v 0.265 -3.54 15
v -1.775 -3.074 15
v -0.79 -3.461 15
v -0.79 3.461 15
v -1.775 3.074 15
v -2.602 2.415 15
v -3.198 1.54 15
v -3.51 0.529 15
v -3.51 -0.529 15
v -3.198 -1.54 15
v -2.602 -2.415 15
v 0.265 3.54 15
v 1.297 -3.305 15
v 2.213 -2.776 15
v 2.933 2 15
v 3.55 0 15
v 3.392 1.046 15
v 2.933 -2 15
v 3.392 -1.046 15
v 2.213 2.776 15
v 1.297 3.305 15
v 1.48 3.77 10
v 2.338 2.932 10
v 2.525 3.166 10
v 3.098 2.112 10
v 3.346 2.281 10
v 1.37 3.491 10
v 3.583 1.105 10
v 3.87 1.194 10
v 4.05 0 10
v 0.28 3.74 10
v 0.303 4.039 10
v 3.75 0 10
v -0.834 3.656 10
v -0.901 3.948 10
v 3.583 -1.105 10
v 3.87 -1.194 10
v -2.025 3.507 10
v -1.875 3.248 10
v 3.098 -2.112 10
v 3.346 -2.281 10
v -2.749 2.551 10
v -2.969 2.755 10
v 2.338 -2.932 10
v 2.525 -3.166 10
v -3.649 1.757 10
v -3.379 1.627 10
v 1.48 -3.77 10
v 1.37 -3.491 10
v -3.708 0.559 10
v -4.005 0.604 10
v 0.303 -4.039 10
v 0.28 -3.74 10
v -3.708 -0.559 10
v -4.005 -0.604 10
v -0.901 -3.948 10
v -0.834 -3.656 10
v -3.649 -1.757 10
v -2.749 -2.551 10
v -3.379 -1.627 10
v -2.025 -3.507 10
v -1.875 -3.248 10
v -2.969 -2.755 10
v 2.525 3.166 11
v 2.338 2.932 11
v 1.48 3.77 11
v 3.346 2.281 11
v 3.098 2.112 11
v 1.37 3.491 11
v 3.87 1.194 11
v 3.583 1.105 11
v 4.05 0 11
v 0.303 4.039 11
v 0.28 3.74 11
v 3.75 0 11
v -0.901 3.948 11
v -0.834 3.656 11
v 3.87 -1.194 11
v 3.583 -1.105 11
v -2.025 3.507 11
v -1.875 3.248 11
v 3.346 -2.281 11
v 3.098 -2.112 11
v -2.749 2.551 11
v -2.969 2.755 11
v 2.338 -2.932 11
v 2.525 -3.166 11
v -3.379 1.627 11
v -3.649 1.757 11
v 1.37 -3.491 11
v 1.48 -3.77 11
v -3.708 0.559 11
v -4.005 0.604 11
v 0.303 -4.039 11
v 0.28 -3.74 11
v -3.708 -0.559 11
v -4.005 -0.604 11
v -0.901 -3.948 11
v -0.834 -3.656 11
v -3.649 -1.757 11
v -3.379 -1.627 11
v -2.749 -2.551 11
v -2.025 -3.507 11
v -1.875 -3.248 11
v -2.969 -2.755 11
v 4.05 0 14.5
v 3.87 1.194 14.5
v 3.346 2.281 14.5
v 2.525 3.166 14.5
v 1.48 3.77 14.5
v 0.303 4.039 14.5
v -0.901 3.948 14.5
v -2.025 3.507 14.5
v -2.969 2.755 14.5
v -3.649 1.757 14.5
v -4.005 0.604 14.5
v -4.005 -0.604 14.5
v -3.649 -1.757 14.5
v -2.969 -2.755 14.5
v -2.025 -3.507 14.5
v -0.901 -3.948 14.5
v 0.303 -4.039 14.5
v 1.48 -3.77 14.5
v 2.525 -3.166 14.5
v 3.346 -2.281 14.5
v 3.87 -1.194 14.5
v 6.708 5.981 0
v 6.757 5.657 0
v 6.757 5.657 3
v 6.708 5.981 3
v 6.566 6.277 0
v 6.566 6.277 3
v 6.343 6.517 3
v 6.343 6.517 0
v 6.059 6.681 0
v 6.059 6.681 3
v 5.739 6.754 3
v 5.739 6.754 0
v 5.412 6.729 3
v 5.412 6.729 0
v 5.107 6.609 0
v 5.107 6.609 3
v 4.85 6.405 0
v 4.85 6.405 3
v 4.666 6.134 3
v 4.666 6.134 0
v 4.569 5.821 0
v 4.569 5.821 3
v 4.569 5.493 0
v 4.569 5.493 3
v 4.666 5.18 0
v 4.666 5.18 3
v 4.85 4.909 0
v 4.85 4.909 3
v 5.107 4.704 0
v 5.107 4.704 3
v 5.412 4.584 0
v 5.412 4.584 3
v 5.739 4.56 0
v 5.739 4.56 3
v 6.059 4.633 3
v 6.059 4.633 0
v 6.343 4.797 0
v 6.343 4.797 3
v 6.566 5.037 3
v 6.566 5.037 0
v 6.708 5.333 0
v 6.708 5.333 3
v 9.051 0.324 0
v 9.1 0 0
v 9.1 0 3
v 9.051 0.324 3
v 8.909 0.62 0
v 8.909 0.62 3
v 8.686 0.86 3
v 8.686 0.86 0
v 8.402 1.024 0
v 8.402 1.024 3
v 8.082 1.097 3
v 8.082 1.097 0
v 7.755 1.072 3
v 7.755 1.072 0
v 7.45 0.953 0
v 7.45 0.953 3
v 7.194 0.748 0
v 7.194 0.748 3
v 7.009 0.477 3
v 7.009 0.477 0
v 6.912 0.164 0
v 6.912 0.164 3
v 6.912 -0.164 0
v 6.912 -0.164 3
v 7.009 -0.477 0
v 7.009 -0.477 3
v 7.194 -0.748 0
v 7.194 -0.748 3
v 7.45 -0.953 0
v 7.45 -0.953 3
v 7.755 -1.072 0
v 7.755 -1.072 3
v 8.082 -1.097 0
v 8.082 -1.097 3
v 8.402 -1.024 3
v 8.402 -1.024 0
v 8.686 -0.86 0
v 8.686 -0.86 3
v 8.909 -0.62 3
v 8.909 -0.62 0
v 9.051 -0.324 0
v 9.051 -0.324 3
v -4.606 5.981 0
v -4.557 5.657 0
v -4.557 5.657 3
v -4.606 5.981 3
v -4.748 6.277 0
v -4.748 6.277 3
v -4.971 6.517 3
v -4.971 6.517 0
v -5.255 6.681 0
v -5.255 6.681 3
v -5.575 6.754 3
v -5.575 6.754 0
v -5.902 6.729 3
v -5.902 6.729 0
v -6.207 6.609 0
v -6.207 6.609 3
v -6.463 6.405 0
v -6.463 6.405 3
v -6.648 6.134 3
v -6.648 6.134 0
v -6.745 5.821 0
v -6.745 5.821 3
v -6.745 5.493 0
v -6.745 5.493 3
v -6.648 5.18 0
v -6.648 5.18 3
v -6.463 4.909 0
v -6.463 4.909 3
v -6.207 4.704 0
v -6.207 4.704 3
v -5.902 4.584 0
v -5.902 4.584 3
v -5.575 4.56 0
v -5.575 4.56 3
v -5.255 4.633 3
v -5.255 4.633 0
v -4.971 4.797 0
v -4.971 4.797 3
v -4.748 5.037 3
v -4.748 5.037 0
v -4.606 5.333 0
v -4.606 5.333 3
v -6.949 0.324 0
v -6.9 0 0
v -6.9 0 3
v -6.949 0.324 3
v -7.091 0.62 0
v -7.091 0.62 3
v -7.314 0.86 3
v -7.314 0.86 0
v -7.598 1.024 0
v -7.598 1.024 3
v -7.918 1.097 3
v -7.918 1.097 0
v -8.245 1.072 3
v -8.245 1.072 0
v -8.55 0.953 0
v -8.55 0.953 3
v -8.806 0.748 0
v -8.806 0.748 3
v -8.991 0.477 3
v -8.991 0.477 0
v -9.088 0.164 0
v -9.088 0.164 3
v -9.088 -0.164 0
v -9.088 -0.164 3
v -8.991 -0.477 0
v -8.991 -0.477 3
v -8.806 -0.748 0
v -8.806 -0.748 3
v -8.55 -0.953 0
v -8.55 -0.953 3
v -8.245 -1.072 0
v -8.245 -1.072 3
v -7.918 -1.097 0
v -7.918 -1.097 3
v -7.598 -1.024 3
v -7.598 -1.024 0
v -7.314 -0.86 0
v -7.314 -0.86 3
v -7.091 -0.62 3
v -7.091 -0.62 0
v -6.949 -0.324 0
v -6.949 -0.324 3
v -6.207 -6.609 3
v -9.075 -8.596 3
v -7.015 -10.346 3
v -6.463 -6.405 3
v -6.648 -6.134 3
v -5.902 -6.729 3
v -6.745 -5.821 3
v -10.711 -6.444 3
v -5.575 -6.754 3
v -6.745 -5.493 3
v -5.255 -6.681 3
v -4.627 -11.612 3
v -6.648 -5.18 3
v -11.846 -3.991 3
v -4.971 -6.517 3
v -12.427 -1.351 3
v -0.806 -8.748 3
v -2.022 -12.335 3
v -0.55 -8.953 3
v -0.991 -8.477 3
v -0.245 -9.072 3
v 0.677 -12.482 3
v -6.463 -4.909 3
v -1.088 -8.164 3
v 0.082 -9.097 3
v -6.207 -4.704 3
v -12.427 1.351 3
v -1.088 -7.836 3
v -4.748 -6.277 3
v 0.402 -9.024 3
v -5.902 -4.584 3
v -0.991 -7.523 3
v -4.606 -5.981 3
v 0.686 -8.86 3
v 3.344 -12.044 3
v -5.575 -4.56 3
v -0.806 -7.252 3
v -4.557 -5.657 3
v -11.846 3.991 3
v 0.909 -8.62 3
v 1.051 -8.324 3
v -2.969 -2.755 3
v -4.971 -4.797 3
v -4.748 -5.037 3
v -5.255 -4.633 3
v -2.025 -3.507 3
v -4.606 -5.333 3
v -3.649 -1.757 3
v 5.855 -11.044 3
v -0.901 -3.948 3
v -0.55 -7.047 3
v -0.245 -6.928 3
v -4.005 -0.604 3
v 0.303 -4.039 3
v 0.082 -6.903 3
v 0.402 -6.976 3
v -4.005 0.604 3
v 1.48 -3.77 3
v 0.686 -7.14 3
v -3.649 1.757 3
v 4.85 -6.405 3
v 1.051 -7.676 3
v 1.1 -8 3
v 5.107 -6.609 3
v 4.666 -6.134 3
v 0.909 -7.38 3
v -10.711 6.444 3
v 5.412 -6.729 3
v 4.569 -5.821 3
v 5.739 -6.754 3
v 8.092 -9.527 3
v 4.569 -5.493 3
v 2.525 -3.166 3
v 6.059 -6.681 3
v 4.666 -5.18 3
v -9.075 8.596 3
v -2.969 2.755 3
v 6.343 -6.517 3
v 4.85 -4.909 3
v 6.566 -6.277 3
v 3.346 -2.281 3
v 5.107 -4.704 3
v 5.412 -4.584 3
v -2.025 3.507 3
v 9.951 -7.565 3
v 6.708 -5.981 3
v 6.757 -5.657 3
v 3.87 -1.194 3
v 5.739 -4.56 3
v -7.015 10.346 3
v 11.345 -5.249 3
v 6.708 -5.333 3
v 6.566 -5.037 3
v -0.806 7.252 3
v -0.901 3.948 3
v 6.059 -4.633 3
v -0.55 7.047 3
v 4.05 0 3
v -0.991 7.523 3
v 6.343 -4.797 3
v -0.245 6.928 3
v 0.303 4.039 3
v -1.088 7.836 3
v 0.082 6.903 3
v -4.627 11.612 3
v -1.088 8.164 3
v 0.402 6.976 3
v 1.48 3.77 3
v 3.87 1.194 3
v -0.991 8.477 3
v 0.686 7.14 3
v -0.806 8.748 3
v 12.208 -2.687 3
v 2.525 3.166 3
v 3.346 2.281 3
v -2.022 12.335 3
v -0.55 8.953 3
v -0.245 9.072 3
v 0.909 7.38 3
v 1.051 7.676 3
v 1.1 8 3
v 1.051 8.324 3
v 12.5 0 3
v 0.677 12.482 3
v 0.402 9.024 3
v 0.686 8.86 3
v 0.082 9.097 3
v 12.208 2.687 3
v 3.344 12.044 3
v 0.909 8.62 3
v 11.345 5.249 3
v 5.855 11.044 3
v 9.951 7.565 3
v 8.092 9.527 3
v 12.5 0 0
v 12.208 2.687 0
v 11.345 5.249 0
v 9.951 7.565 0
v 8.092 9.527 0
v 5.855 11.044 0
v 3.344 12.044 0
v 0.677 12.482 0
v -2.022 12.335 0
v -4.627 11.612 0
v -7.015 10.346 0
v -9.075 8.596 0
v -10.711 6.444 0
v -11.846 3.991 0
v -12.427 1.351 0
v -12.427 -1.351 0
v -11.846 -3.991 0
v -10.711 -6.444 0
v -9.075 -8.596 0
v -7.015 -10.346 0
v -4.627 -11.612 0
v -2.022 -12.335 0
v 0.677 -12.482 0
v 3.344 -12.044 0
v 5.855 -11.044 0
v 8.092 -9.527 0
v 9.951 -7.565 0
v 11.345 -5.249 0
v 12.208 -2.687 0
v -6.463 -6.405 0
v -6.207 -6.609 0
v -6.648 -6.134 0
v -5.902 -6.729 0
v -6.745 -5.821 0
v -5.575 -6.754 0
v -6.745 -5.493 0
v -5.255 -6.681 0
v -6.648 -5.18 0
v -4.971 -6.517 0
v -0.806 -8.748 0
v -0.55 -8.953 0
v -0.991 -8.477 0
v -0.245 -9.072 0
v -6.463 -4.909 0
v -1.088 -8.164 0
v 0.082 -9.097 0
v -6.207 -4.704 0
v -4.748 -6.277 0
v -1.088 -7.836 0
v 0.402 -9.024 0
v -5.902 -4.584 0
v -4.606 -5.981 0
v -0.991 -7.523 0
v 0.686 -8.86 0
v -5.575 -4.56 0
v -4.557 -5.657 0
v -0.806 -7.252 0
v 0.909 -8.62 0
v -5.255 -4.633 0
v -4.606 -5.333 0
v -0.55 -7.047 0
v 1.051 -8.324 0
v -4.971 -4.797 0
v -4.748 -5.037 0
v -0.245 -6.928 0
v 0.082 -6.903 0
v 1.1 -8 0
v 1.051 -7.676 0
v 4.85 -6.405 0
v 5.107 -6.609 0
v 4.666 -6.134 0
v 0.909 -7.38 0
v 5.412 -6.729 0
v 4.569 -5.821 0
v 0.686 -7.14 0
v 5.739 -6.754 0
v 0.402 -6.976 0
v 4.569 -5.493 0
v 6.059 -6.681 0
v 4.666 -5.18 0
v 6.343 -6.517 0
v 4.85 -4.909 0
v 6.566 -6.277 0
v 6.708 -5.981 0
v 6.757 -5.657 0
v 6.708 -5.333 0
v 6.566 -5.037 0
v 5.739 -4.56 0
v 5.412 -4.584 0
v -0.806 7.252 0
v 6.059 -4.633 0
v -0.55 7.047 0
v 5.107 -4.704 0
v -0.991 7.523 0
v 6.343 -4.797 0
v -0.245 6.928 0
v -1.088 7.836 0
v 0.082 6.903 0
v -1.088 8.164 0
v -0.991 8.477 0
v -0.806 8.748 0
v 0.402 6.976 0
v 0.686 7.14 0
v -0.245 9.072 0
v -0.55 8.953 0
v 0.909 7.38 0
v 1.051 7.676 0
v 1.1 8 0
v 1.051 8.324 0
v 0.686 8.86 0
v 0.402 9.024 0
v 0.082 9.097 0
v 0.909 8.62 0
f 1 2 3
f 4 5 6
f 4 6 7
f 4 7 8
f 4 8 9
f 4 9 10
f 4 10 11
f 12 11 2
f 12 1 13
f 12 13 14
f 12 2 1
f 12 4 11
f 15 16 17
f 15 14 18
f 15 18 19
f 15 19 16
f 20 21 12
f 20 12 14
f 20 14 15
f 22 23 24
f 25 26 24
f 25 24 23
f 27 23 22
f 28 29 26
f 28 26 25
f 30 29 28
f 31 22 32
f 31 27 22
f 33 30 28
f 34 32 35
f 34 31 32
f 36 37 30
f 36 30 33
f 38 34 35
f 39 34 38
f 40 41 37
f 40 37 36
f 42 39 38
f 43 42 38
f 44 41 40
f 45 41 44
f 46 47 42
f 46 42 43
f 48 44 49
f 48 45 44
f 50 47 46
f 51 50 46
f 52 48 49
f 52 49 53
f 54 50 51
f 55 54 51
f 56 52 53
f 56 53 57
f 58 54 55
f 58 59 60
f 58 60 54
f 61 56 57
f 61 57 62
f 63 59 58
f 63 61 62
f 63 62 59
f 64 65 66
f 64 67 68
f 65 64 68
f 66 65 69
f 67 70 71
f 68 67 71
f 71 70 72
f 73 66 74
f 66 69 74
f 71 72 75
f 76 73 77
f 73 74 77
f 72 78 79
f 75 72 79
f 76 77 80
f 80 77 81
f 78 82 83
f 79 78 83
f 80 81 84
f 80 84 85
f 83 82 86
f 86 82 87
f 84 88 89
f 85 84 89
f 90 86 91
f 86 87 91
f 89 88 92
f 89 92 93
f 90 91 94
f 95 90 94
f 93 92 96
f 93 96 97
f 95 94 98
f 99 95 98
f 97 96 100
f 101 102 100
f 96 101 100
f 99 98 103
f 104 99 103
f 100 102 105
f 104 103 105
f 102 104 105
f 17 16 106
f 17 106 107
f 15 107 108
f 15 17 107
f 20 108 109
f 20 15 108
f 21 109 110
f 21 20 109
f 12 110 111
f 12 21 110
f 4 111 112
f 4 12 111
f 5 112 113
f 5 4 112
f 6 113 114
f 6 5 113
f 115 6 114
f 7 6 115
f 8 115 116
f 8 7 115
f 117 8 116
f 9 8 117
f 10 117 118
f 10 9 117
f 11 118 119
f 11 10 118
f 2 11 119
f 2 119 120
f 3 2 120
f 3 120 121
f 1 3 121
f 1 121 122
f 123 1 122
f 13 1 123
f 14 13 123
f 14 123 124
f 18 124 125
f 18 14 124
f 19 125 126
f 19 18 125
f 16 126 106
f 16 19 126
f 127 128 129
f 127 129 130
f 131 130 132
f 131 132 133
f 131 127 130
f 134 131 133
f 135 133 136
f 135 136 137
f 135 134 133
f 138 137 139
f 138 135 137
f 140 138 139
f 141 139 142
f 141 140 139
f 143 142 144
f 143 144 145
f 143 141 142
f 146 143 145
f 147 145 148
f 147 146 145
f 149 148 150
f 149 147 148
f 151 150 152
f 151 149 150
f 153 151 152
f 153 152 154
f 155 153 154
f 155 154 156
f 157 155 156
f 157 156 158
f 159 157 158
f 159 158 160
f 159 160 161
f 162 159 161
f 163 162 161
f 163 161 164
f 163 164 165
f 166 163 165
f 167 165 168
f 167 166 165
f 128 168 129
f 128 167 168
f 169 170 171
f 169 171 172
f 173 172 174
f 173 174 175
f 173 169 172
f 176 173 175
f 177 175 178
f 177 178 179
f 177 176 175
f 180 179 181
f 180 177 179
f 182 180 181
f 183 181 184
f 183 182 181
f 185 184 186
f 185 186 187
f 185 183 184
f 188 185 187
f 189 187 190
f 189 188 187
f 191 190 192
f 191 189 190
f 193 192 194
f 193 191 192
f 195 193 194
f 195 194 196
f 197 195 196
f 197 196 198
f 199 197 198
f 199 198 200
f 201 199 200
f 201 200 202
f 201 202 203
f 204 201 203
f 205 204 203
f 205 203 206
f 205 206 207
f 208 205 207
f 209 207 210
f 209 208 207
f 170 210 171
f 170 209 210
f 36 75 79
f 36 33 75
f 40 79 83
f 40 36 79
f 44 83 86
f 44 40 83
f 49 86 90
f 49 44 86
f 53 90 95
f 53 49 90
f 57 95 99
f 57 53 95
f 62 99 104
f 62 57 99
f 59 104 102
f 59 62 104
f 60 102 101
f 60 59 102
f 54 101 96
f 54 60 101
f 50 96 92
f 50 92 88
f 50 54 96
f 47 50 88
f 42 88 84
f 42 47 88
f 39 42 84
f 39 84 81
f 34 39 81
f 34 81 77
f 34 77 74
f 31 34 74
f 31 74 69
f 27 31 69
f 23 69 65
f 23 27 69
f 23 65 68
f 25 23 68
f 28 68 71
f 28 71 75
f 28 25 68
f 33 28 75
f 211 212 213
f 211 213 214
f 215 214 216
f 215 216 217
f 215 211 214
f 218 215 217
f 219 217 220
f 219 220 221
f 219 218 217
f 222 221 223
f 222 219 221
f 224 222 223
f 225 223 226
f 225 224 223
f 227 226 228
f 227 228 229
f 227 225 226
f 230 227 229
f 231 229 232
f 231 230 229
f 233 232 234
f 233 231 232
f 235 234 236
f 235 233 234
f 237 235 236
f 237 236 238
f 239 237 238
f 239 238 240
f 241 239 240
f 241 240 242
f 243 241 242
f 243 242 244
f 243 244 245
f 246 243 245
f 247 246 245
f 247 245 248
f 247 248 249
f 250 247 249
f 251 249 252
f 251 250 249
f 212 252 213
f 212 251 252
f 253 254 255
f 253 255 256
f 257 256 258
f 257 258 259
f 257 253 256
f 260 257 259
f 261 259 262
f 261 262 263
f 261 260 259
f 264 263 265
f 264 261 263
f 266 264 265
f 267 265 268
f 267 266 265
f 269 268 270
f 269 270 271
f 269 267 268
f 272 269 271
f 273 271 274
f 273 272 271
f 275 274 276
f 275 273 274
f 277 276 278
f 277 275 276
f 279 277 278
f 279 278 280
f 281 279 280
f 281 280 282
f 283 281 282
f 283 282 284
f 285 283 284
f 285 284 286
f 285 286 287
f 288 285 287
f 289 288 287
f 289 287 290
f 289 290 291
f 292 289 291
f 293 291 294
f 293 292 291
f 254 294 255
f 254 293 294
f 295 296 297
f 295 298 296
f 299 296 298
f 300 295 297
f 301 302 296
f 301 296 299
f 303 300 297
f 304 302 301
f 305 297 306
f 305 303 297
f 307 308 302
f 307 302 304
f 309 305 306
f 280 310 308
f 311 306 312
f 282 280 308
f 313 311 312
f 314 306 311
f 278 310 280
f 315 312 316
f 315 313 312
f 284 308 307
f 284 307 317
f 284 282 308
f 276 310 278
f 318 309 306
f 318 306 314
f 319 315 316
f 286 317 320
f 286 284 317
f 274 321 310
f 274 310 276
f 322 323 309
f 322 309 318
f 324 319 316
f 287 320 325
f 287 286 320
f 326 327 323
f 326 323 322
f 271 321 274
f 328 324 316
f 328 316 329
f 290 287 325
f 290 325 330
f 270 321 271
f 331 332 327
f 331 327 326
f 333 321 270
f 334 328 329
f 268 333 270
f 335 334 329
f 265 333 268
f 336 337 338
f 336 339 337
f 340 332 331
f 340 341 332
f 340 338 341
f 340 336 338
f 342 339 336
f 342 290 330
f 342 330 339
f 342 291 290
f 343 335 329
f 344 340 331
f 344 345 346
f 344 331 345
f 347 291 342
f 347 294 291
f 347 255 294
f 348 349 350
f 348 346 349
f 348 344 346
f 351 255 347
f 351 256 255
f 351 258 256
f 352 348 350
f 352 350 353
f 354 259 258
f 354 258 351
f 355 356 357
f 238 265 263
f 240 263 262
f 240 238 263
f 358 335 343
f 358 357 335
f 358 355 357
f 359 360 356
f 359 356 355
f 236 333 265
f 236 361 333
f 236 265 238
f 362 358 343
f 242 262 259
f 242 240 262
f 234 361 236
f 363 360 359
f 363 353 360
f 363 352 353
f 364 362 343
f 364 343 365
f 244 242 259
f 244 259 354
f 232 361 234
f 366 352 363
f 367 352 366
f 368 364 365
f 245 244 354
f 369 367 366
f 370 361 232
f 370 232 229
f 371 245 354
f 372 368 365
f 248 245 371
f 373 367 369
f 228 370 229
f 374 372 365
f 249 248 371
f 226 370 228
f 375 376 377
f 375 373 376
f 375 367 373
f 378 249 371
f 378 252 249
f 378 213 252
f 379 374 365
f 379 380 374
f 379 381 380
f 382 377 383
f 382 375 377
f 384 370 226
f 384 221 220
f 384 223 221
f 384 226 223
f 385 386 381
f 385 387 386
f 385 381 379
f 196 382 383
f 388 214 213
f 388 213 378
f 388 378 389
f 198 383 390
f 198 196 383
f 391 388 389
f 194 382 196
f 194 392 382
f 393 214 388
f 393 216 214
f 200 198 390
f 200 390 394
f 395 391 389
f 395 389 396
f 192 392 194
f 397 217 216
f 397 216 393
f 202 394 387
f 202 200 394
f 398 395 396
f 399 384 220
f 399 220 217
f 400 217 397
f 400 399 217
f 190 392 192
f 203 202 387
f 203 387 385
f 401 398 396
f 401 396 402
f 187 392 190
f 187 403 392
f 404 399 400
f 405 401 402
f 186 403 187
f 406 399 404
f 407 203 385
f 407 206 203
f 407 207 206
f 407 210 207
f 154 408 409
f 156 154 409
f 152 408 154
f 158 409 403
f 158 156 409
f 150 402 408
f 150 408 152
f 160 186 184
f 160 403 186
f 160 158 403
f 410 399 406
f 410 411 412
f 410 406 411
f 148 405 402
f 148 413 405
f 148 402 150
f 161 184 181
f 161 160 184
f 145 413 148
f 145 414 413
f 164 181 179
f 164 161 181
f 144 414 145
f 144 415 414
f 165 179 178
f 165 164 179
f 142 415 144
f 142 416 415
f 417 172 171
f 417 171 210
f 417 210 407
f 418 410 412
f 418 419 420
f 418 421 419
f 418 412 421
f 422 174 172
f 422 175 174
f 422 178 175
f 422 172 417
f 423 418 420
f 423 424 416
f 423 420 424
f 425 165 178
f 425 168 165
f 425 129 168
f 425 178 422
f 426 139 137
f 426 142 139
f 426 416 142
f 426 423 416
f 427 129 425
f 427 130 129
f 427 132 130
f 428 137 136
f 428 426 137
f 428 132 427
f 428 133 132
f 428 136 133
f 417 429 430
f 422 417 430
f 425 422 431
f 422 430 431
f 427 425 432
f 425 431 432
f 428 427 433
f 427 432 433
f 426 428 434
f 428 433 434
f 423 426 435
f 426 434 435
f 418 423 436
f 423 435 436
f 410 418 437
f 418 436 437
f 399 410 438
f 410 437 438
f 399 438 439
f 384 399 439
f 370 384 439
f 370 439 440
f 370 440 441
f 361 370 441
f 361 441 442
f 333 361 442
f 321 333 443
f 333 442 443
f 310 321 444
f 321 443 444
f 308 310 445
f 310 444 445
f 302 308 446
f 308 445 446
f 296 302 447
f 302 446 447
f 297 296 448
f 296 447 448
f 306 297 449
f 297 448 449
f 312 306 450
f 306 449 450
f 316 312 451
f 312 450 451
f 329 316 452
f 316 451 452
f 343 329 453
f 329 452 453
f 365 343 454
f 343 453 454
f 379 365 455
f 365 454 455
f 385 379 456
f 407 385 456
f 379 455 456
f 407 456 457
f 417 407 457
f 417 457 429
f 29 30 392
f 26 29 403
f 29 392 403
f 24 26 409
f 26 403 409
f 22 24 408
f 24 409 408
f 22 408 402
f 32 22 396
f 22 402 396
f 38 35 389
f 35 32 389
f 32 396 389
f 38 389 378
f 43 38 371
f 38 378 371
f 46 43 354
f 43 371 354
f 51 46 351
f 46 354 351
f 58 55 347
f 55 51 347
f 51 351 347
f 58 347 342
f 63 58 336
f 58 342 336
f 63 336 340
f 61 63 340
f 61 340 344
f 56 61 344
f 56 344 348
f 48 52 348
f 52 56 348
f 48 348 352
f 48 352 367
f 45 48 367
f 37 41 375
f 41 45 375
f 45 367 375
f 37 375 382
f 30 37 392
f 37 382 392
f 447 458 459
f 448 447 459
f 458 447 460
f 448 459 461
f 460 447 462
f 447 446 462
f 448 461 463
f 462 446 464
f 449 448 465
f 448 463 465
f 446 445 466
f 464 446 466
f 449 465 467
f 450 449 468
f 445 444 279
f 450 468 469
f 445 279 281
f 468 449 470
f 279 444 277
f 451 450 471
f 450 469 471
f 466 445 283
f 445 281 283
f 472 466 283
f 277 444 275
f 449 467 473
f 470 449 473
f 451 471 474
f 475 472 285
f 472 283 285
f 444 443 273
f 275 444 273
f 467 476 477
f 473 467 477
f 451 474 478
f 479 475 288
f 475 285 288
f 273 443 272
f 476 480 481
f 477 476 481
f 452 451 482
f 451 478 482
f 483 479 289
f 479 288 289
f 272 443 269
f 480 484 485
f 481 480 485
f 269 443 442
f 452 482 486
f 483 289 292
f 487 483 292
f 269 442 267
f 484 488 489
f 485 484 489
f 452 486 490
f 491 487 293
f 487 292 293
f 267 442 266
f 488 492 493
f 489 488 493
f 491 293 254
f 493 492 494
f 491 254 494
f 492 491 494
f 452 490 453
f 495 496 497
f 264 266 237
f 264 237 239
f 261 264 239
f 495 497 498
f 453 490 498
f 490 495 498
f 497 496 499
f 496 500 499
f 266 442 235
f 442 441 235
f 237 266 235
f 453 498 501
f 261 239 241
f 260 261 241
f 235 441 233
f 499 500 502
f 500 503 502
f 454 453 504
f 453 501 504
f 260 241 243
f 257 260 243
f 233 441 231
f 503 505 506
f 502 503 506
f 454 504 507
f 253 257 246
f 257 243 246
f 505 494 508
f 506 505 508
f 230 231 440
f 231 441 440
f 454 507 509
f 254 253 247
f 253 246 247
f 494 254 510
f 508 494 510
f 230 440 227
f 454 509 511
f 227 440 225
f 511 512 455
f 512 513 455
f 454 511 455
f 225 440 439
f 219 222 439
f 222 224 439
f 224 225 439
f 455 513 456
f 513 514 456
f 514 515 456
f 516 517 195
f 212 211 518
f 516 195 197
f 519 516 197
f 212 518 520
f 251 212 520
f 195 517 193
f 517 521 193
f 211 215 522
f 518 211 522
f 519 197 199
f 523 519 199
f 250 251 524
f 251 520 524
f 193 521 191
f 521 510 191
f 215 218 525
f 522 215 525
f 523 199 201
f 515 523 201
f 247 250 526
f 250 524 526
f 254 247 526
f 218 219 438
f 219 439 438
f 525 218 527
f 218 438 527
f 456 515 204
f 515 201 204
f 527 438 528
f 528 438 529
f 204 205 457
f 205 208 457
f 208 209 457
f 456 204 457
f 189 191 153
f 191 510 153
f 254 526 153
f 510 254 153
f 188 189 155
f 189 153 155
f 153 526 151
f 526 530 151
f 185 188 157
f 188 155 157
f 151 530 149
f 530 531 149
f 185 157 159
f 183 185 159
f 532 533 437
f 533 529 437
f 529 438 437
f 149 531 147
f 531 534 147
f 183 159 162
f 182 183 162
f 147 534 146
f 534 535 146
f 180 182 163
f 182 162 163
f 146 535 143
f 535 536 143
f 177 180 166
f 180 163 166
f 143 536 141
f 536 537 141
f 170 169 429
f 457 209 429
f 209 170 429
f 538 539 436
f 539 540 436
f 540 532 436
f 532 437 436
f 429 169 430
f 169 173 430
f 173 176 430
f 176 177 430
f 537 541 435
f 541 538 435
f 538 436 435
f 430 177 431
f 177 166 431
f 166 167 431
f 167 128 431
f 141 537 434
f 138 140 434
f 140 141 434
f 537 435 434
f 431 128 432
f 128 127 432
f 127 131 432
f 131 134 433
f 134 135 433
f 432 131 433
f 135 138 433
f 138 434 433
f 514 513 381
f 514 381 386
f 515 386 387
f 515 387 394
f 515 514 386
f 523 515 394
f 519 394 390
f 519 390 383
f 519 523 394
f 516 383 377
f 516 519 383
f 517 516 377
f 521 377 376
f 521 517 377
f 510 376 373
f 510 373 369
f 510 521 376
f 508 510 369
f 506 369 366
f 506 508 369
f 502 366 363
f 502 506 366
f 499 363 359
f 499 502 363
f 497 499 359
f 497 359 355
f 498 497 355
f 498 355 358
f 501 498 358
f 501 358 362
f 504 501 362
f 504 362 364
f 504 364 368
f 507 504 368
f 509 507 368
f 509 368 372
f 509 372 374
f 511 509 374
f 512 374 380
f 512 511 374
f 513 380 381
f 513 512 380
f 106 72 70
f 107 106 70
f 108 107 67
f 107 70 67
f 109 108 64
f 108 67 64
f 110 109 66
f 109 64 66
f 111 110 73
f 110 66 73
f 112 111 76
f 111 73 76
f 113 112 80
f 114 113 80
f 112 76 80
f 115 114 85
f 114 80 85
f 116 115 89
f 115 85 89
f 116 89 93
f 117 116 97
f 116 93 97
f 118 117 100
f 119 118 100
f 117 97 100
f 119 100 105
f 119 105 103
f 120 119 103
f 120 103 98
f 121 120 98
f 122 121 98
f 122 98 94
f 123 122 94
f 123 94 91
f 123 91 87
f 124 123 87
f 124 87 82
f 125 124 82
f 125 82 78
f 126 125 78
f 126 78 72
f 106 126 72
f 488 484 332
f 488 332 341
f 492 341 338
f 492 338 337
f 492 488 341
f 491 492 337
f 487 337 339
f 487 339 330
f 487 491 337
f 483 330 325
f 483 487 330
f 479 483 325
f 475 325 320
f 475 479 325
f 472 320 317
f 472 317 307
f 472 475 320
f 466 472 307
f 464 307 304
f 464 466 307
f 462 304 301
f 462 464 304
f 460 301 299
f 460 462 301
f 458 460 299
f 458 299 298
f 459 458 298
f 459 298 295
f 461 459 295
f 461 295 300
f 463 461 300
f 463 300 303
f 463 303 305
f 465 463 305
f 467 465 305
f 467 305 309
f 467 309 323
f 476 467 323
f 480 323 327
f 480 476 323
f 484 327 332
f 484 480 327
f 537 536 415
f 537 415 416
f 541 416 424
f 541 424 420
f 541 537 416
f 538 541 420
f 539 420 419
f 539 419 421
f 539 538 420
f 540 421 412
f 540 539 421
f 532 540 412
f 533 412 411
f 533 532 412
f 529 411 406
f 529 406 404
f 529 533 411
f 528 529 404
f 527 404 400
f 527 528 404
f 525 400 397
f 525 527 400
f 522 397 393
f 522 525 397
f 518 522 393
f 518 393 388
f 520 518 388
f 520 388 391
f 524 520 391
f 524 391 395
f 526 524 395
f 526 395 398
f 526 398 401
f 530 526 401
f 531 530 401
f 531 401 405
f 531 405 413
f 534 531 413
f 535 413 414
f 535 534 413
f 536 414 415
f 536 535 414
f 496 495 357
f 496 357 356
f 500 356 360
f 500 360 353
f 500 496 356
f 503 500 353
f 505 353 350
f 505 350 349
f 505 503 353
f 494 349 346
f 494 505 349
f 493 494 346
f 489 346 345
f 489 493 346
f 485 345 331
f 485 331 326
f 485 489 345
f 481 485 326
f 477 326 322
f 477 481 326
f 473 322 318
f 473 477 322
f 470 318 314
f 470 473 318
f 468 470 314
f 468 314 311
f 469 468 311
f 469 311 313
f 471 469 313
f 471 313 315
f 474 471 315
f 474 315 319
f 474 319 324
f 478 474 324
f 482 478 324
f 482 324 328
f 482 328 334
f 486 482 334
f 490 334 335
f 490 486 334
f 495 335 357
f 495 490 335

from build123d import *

# Parameters (mm, degrees)
SKETCH1_R           = 12.5
SKETCH1_R_2         = 1.1
BOSS_EXTRUDE1_DEPTH = 3
SKETCH2_R           = 4.05
BOSS_EXTRUDE2_DEPTH = 12
SKETCH3_W           = 1
SKETCH3_H           = 0.6
FILLET1_SIZE        = 0.5


with BuildPart() as part:
    # Sketch1 → Boss-Extrude1 (new body)
    with BuildSketch(Plane.XY):
        Circle(SKETCH1_R)
        with Locations((0, 8)):
            Circle(SKETCH1_R_2, mode=Mode.SUBTRACT)
        with Locations((5.656854249, 5.656854249)):
            Circle(SKETCH1_R_2, mode=Mode.SUBTRACT)
        with Locations((8, 0)):
            Circle(SKETCH1_R_2, mode=Mode.SUBTRACT)
        with Locations((5.656854249, -5.656854249)):
            Circle(SKETCH1_R_2, mode=Mode.SUBTRACT)
        with Locations((0, -8)):
            Circle(SKETCH1_R_2, mode=Mode.SUBTRACT)
        with Locations((-5.656854249, -5.656854249)):
            Circle(SKETCH1_R_2, mode=Mode.SUBTRACT)
        with Locations((-8, 0)):
            Circle(SKETCH1_R_2, mode=Mode.SUBTRACT)
        with Locations((-5.656854249, 5.656854249)):
            Circle(SKETCH1_R_2, mode=Mode.SUBTRACT)
    extrude(amount=BOSS_EXTRUDE1_DEPTH)

    # Sketch2 → Boss-Extrude2 (add)
    with BuildSketch(Plane.XY.offset(3)):
        Circle(SKETCH2_R)
    extrude(amount=BOSS_EXTRUDE2_DEPTH)

    # Sketch3 → Cut-Revolve1 (revolve, cut)
    with BuildSketch(Plane(origin=(0, 0, 0), x_dir=(0, 0, -1), z_dir=(1, 0, 0))):
        with Locations((-10.5, 4.05)):
            Rectangle(SKETCH3_W, SKETCH3_H)
    revolve(axis=Axis((0, 0, 15), (0, 0, -1)), mode=Mode.SUBTRACT)

    # Fillet1
    fillet1_edges = [part.edges().sort_by_distance(p)[0] for p in [
        (-4.05, 0, 15),
    ]]
    chamfer(fillet1_edges, length=FILLET1_SIZE)


solid = part.part
